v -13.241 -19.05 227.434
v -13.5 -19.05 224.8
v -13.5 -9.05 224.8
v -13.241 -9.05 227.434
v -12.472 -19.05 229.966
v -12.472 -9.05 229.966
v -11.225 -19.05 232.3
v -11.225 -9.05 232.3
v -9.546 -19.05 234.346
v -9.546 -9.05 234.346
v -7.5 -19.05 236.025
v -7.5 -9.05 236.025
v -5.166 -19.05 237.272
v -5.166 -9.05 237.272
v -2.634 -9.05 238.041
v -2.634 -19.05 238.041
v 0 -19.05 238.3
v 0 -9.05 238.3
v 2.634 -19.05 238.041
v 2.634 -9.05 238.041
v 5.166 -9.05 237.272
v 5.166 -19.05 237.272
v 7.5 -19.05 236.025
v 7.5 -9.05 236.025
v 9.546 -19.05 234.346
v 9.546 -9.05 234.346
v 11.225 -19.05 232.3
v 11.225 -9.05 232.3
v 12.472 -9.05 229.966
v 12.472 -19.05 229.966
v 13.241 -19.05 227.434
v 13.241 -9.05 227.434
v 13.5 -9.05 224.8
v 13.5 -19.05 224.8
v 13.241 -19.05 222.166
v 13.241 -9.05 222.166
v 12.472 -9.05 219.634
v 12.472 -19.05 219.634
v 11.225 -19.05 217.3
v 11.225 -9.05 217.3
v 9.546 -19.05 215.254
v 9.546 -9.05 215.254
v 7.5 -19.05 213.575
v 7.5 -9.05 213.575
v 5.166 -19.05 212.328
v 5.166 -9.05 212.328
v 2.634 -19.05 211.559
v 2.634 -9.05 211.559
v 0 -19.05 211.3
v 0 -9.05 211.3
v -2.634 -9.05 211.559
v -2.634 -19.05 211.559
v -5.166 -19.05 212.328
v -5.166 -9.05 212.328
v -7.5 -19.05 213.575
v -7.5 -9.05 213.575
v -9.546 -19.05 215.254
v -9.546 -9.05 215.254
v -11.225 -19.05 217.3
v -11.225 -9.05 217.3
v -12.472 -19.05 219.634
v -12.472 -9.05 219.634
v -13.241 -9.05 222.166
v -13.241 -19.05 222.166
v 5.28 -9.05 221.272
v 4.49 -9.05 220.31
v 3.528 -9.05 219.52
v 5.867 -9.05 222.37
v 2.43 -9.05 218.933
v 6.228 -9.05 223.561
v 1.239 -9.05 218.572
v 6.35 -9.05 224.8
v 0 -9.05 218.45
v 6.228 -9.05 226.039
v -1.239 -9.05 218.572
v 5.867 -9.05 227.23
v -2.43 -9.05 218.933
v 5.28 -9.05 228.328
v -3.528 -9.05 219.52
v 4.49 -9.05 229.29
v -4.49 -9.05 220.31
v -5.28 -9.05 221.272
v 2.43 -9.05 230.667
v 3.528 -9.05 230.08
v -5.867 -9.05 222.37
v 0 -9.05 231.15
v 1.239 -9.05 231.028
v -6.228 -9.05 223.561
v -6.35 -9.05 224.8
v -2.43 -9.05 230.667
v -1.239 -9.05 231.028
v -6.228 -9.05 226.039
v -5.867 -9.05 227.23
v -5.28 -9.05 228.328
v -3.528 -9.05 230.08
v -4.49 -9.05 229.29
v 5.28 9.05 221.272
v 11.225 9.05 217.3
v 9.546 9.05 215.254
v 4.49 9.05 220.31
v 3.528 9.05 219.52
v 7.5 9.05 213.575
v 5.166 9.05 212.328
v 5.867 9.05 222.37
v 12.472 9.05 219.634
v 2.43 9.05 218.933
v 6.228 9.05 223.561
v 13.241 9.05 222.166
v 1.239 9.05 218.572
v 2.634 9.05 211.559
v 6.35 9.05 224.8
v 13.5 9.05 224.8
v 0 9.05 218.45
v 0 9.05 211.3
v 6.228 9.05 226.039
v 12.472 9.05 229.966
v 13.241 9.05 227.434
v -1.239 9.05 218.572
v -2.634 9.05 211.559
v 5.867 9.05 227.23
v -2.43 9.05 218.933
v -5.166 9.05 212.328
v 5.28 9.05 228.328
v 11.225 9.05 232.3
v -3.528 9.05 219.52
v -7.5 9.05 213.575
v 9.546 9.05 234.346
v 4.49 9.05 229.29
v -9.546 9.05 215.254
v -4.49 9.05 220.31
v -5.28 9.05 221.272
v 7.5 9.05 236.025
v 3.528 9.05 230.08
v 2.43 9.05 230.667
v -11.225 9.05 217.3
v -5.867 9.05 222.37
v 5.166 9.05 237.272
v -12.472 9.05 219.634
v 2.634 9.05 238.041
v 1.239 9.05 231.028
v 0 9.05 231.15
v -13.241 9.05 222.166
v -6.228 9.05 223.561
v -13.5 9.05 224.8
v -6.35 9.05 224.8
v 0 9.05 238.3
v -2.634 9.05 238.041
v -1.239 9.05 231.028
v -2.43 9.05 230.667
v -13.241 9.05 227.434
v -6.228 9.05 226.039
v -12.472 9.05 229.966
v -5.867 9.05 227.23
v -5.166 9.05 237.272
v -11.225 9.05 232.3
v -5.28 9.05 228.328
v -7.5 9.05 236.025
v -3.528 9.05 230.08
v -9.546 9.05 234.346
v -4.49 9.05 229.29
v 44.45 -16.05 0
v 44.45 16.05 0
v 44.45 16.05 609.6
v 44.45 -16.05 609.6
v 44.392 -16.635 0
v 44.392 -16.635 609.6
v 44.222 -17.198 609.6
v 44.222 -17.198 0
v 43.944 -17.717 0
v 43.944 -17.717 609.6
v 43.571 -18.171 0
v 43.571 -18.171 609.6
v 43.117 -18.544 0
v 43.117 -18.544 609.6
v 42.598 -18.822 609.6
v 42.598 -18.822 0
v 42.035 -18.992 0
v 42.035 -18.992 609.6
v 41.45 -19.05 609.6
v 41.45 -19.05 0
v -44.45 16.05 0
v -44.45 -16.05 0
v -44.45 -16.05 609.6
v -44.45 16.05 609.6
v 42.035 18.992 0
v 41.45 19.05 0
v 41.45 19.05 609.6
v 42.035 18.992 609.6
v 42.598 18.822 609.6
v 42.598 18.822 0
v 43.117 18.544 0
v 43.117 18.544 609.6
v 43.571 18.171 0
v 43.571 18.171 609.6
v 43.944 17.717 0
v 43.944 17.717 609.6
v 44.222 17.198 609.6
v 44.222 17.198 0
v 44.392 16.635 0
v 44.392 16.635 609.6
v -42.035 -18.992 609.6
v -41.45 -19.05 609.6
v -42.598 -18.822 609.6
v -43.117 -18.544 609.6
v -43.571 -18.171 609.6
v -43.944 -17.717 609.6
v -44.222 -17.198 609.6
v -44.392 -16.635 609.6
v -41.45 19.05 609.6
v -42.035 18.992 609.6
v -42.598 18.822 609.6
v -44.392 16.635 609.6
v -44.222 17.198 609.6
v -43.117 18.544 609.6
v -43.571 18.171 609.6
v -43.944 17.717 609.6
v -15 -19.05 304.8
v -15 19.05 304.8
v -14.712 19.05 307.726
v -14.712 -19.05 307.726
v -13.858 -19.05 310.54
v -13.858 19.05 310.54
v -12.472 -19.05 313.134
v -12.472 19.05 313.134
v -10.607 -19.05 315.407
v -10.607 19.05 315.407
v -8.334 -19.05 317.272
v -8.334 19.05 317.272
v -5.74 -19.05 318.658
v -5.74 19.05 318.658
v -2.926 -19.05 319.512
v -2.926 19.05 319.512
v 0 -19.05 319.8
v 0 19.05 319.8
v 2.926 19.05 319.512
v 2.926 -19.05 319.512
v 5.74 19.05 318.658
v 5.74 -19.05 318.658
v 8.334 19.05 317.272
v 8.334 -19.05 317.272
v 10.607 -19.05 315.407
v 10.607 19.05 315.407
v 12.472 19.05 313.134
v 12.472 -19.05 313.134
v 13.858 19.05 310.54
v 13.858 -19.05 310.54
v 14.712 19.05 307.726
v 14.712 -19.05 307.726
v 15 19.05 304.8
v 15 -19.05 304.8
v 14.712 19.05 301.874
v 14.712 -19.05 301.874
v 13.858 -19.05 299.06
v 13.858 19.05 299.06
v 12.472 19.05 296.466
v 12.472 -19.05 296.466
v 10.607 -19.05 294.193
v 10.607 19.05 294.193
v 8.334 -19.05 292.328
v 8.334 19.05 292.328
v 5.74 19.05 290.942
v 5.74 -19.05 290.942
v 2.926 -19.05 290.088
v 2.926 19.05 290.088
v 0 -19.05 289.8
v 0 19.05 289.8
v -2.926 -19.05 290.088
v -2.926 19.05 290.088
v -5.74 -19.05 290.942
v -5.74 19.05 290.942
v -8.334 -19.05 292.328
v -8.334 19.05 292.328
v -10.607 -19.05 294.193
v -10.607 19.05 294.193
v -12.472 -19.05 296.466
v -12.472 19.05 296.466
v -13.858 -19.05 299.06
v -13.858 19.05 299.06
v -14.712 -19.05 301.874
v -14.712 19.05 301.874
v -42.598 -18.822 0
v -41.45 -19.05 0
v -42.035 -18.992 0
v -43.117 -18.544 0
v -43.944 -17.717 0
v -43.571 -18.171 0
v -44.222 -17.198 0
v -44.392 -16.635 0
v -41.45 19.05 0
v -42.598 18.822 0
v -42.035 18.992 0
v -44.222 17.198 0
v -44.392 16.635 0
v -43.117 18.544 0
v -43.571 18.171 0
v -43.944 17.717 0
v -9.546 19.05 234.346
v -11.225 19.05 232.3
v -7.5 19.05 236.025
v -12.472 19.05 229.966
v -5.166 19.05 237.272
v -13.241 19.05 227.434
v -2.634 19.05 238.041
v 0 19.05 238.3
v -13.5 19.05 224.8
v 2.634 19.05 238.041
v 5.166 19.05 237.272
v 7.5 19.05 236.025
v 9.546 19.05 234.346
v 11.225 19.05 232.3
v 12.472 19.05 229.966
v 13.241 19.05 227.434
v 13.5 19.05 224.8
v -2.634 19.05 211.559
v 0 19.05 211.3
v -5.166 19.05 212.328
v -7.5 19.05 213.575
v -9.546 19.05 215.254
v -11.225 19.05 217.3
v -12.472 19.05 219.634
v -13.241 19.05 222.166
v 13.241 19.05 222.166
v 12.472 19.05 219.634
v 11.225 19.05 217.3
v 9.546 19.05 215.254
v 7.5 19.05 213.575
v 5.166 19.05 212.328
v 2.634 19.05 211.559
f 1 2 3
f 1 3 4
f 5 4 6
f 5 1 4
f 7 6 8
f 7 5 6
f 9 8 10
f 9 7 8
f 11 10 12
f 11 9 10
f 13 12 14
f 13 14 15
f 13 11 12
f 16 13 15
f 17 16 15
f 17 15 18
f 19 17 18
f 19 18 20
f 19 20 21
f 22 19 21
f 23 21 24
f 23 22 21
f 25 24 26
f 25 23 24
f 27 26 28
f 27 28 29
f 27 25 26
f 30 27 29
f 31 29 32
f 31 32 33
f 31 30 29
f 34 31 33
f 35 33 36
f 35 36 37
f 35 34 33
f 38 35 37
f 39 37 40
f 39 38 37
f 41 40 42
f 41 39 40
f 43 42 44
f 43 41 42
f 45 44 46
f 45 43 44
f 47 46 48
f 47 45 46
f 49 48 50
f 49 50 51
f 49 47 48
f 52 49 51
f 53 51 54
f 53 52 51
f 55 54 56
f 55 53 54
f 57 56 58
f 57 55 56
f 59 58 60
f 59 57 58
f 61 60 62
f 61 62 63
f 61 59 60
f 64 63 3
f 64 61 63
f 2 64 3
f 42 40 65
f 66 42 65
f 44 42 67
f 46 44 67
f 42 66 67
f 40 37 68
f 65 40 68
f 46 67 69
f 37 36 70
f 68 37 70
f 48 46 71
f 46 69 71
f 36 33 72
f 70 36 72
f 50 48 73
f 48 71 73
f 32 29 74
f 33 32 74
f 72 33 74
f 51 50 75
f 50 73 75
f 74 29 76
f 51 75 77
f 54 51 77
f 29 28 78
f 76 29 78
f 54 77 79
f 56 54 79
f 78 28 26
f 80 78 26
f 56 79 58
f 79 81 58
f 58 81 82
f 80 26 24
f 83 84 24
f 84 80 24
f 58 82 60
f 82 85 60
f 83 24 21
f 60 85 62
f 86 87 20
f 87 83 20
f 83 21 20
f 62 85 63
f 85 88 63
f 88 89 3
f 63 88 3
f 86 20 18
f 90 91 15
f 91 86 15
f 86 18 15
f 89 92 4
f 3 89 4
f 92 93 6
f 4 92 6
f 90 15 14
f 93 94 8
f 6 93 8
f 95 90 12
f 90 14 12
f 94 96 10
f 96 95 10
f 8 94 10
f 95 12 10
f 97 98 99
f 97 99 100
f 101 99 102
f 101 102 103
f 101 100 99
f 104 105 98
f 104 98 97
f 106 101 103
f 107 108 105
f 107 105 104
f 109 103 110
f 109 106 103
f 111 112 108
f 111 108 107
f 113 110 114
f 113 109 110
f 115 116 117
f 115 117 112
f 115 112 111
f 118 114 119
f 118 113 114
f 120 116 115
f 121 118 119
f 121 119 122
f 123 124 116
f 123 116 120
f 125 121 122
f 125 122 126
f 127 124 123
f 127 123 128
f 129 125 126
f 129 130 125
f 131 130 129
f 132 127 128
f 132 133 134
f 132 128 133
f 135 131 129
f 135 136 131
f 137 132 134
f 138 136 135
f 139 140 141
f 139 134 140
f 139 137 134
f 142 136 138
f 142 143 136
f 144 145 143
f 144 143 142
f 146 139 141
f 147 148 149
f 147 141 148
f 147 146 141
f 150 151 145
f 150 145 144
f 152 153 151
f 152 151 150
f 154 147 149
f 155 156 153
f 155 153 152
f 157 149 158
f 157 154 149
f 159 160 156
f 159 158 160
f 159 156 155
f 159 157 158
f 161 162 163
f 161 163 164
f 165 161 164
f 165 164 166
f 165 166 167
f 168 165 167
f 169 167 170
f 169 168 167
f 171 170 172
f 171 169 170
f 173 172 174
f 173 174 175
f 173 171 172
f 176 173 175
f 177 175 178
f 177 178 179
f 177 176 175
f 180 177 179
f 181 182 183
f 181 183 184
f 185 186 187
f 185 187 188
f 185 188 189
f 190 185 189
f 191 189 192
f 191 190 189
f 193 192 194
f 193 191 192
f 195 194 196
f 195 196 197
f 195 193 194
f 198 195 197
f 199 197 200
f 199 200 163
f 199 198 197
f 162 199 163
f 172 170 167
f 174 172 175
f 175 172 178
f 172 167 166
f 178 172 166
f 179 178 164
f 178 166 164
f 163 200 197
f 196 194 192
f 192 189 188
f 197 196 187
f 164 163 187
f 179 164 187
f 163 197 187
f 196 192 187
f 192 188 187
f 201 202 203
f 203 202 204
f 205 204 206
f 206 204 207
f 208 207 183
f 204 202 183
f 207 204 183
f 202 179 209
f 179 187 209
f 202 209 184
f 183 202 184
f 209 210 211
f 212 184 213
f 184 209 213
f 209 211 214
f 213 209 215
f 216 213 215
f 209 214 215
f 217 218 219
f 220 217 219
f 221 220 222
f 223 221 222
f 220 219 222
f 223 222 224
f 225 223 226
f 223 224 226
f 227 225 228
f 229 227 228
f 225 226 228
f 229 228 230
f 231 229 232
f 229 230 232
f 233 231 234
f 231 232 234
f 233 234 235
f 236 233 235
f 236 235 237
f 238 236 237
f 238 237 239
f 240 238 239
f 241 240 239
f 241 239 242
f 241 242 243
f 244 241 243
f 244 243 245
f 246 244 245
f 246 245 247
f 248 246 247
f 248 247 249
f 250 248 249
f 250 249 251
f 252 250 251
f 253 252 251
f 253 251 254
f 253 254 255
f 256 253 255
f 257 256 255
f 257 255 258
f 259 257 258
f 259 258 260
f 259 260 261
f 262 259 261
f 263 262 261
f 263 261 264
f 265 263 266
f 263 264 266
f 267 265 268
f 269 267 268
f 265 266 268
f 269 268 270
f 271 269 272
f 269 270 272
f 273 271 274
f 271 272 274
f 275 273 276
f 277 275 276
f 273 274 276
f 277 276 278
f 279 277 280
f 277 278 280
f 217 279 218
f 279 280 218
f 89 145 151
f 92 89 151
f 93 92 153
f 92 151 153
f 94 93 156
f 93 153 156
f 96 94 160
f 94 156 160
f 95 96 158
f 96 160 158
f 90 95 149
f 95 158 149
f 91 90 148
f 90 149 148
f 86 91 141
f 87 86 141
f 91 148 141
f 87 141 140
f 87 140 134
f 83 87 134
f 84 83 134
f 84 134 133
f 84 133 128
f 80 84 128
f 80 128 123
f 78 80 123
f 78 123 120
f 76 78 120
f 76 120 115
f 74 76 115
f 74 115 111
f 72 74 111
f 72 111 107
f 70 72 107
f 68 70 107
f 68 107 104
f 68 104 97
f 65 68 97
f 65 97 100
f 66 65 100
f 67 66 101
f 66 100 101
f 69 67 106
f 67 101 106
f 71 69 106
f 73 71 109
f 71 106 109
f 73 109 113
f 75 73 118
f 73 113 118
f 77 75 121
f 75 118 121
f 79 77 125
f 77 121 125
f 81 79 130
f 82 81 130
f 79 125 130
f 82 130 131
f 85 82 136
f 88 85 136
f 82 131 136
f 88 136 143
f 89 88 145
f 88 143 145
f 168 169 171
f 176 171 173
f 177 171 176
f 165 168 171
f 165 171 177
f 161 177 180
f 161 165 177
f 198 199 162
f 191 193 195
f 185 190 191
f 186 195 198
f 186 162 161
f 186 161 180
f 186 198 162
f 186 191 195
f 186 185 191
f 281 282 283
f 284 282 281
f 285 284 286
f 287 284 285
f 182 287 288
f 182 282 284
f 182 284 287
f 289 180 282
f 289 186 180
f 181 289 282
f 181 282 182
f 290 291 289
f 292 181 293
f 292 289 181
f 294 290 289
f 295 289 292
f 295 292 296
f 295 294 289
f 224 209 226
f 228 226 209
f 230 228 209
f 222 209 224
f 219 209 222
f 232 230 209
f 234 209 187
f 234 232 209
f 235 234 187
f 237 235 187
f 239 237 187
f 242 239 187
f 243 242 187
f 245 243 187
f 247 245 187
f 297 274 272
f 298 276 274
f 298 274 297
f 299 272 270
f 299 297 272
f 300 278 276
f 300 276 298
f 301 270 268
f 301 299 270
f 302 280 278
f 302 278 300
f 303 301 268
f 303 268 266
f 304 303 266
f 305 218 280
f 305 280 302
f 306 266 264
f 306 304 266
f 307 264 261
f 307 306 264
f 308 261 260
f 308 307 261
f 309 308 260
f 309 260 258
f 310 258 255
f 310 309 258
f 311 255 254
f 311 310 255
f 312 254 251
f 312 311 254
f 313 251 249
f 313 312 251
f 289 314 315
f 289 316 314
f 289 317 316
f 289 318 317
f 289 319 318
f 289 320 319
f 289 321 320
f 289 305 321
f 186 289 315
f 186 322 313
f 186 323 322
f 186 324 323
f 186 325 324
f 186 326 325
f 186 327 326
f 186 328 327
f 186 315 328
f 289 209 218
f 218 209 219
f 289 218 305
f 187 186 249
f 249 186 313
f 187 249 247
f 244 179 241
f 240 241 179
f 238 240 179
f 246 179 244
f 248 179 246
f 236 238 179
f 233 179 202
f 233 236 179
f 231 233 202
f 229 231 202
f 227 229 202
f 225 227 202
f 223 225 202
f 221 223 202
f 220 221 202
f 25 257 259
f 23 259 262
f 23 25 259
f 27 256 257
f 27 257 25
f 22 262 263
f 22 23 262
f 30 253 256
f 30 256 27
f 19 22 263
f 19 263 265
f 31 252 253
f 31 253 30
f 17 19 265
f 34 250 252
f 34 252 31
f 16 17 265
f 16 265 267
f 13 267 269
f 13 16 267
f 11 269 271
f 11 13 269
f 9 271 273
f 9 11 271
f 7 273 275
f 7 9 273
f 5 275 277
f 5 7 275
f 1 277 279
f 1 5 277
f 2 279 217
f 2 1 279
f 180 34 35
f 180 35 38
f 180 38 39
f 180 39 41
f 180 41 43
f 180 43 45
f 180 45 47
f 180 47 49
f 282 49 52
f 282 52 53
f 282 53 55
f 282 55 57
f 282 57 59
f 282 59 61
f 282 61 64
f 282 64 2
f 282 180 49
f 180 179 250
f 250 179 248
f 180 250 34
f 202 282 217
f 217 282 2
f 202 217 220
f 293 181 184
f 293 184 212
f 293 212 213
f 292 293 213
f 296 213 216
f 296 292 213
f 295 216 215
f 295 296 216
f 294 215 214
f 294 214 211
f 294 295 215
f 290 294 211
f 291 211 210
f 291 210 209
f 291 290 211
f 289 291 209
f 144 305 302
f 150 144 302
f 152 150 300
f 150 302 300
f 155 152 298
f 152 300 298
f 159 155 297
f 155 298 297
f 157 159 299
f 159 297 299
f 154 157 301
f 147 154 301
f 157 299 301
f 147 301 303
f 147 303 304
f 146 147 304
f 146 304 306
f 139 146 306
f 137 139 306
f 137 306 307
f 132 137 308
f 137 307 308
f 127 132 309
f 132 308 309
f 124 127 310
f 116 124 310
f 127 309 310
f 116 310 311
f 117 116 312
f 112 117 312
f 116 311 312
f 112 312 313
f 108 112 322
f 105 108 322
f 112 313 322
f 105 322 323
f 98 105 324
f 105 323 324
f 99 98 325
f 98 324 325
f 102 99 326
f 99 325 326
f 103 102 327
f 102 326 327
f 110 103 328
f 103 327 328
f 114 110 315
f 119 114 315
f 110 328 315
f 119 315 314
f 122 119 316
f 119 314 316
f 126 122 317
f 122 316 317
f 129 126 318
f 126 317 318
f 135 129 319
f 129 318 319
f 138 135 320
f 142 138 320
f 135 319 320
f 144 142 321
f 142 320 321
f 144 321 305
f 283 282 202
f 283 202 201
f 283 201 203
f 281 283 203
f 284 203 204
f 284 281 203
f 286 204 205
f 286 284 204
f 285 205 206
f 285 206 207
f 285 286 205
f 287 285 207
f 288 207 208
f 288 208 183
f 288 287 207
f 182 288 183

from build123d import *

# Parameters (mm, degrees)
BOSS_EXTRUDE1_DEPTH = 609.6
SKETCH2_R           = 15
SKETCH2_R_2         = 6.35
CUT_EXTRUDE1_DEPTH  = 613.404745654
SKETCH3_R           = 13.5001
CUT_EXTRUDE2_DEPTH  = 10


with BuildPart() as part:
    # Sketch1 → Boss-Extrude1 (new body)
    with BuildSketch(Plane.XY):
        with BuildLine():
            Line((41.45, -19.05), (-41.45, -19.05))
            ThreePointArc((-41.45, -19.05), (-43.571320344, -18.171320344), (-44.45, -16.05))
            Line((-44.45, -16.05), (-44.45, 16.05))
            ThreePointArc((-44.45, 16.05), (-43.571320344, 18.171320344), (-41.45, 19.05))
            Line((-41.45, 19.05), (41.45, 19.05))
            ThreePointArc((41.45, 19.05), (43.571320344, 18.171320344), (44.45, 16.05))
            Line((44.45, 16.05), (44.45, -16.05))
            ThreePointArc((44.45, -16.05), (43.571320344, -18.171320344), (41.45, -19.05))
        make_face()
    extrude(amount=BOSS_EXTRUDE1_DEPTH)

    # Sketch2 → Cut-Extrude1 (cut, through all)
    with BuildSketch(Plane(origin=(0, 19.05, 0), x_dir=(1, 0, 0), z_dir=(0, 1, 0))):
        with Locations(Location((0, -304.8, 0), (0, 0, 180))):
            Circle(SKETCH2_R)
        with Locations(Location((0, -224.8, 0), (0, 0, 180))):
            Circle(SKETCH2_R_2)
    extrude(amount=-CUT_EXTRUDE1_DEPTH, mode=Mode.SUBTRACT)

    # Sketch3 → Cut-Extrude2 (cut)
    with BuildSketch(Plane(origin=(0, 19.05, 0), x_dir=(1, 0, 0), z_dir=(0, 1, 0))):
        with Locations(Location((0, -224.8, 0), (0, 0, 180))):
            Circle(SKETCH3_R)
    cut_extrude2 = extrude(amount=-CUT_EXTRUDE2_DEPTH, mode=Mode.SUBTRACT)

    # Mirror1: Cut-Extrude2 across plane
    add(cut_extrude2.mirror(Plane.ZX), mode=Mode.SUBTRACT)


solid = part.part
